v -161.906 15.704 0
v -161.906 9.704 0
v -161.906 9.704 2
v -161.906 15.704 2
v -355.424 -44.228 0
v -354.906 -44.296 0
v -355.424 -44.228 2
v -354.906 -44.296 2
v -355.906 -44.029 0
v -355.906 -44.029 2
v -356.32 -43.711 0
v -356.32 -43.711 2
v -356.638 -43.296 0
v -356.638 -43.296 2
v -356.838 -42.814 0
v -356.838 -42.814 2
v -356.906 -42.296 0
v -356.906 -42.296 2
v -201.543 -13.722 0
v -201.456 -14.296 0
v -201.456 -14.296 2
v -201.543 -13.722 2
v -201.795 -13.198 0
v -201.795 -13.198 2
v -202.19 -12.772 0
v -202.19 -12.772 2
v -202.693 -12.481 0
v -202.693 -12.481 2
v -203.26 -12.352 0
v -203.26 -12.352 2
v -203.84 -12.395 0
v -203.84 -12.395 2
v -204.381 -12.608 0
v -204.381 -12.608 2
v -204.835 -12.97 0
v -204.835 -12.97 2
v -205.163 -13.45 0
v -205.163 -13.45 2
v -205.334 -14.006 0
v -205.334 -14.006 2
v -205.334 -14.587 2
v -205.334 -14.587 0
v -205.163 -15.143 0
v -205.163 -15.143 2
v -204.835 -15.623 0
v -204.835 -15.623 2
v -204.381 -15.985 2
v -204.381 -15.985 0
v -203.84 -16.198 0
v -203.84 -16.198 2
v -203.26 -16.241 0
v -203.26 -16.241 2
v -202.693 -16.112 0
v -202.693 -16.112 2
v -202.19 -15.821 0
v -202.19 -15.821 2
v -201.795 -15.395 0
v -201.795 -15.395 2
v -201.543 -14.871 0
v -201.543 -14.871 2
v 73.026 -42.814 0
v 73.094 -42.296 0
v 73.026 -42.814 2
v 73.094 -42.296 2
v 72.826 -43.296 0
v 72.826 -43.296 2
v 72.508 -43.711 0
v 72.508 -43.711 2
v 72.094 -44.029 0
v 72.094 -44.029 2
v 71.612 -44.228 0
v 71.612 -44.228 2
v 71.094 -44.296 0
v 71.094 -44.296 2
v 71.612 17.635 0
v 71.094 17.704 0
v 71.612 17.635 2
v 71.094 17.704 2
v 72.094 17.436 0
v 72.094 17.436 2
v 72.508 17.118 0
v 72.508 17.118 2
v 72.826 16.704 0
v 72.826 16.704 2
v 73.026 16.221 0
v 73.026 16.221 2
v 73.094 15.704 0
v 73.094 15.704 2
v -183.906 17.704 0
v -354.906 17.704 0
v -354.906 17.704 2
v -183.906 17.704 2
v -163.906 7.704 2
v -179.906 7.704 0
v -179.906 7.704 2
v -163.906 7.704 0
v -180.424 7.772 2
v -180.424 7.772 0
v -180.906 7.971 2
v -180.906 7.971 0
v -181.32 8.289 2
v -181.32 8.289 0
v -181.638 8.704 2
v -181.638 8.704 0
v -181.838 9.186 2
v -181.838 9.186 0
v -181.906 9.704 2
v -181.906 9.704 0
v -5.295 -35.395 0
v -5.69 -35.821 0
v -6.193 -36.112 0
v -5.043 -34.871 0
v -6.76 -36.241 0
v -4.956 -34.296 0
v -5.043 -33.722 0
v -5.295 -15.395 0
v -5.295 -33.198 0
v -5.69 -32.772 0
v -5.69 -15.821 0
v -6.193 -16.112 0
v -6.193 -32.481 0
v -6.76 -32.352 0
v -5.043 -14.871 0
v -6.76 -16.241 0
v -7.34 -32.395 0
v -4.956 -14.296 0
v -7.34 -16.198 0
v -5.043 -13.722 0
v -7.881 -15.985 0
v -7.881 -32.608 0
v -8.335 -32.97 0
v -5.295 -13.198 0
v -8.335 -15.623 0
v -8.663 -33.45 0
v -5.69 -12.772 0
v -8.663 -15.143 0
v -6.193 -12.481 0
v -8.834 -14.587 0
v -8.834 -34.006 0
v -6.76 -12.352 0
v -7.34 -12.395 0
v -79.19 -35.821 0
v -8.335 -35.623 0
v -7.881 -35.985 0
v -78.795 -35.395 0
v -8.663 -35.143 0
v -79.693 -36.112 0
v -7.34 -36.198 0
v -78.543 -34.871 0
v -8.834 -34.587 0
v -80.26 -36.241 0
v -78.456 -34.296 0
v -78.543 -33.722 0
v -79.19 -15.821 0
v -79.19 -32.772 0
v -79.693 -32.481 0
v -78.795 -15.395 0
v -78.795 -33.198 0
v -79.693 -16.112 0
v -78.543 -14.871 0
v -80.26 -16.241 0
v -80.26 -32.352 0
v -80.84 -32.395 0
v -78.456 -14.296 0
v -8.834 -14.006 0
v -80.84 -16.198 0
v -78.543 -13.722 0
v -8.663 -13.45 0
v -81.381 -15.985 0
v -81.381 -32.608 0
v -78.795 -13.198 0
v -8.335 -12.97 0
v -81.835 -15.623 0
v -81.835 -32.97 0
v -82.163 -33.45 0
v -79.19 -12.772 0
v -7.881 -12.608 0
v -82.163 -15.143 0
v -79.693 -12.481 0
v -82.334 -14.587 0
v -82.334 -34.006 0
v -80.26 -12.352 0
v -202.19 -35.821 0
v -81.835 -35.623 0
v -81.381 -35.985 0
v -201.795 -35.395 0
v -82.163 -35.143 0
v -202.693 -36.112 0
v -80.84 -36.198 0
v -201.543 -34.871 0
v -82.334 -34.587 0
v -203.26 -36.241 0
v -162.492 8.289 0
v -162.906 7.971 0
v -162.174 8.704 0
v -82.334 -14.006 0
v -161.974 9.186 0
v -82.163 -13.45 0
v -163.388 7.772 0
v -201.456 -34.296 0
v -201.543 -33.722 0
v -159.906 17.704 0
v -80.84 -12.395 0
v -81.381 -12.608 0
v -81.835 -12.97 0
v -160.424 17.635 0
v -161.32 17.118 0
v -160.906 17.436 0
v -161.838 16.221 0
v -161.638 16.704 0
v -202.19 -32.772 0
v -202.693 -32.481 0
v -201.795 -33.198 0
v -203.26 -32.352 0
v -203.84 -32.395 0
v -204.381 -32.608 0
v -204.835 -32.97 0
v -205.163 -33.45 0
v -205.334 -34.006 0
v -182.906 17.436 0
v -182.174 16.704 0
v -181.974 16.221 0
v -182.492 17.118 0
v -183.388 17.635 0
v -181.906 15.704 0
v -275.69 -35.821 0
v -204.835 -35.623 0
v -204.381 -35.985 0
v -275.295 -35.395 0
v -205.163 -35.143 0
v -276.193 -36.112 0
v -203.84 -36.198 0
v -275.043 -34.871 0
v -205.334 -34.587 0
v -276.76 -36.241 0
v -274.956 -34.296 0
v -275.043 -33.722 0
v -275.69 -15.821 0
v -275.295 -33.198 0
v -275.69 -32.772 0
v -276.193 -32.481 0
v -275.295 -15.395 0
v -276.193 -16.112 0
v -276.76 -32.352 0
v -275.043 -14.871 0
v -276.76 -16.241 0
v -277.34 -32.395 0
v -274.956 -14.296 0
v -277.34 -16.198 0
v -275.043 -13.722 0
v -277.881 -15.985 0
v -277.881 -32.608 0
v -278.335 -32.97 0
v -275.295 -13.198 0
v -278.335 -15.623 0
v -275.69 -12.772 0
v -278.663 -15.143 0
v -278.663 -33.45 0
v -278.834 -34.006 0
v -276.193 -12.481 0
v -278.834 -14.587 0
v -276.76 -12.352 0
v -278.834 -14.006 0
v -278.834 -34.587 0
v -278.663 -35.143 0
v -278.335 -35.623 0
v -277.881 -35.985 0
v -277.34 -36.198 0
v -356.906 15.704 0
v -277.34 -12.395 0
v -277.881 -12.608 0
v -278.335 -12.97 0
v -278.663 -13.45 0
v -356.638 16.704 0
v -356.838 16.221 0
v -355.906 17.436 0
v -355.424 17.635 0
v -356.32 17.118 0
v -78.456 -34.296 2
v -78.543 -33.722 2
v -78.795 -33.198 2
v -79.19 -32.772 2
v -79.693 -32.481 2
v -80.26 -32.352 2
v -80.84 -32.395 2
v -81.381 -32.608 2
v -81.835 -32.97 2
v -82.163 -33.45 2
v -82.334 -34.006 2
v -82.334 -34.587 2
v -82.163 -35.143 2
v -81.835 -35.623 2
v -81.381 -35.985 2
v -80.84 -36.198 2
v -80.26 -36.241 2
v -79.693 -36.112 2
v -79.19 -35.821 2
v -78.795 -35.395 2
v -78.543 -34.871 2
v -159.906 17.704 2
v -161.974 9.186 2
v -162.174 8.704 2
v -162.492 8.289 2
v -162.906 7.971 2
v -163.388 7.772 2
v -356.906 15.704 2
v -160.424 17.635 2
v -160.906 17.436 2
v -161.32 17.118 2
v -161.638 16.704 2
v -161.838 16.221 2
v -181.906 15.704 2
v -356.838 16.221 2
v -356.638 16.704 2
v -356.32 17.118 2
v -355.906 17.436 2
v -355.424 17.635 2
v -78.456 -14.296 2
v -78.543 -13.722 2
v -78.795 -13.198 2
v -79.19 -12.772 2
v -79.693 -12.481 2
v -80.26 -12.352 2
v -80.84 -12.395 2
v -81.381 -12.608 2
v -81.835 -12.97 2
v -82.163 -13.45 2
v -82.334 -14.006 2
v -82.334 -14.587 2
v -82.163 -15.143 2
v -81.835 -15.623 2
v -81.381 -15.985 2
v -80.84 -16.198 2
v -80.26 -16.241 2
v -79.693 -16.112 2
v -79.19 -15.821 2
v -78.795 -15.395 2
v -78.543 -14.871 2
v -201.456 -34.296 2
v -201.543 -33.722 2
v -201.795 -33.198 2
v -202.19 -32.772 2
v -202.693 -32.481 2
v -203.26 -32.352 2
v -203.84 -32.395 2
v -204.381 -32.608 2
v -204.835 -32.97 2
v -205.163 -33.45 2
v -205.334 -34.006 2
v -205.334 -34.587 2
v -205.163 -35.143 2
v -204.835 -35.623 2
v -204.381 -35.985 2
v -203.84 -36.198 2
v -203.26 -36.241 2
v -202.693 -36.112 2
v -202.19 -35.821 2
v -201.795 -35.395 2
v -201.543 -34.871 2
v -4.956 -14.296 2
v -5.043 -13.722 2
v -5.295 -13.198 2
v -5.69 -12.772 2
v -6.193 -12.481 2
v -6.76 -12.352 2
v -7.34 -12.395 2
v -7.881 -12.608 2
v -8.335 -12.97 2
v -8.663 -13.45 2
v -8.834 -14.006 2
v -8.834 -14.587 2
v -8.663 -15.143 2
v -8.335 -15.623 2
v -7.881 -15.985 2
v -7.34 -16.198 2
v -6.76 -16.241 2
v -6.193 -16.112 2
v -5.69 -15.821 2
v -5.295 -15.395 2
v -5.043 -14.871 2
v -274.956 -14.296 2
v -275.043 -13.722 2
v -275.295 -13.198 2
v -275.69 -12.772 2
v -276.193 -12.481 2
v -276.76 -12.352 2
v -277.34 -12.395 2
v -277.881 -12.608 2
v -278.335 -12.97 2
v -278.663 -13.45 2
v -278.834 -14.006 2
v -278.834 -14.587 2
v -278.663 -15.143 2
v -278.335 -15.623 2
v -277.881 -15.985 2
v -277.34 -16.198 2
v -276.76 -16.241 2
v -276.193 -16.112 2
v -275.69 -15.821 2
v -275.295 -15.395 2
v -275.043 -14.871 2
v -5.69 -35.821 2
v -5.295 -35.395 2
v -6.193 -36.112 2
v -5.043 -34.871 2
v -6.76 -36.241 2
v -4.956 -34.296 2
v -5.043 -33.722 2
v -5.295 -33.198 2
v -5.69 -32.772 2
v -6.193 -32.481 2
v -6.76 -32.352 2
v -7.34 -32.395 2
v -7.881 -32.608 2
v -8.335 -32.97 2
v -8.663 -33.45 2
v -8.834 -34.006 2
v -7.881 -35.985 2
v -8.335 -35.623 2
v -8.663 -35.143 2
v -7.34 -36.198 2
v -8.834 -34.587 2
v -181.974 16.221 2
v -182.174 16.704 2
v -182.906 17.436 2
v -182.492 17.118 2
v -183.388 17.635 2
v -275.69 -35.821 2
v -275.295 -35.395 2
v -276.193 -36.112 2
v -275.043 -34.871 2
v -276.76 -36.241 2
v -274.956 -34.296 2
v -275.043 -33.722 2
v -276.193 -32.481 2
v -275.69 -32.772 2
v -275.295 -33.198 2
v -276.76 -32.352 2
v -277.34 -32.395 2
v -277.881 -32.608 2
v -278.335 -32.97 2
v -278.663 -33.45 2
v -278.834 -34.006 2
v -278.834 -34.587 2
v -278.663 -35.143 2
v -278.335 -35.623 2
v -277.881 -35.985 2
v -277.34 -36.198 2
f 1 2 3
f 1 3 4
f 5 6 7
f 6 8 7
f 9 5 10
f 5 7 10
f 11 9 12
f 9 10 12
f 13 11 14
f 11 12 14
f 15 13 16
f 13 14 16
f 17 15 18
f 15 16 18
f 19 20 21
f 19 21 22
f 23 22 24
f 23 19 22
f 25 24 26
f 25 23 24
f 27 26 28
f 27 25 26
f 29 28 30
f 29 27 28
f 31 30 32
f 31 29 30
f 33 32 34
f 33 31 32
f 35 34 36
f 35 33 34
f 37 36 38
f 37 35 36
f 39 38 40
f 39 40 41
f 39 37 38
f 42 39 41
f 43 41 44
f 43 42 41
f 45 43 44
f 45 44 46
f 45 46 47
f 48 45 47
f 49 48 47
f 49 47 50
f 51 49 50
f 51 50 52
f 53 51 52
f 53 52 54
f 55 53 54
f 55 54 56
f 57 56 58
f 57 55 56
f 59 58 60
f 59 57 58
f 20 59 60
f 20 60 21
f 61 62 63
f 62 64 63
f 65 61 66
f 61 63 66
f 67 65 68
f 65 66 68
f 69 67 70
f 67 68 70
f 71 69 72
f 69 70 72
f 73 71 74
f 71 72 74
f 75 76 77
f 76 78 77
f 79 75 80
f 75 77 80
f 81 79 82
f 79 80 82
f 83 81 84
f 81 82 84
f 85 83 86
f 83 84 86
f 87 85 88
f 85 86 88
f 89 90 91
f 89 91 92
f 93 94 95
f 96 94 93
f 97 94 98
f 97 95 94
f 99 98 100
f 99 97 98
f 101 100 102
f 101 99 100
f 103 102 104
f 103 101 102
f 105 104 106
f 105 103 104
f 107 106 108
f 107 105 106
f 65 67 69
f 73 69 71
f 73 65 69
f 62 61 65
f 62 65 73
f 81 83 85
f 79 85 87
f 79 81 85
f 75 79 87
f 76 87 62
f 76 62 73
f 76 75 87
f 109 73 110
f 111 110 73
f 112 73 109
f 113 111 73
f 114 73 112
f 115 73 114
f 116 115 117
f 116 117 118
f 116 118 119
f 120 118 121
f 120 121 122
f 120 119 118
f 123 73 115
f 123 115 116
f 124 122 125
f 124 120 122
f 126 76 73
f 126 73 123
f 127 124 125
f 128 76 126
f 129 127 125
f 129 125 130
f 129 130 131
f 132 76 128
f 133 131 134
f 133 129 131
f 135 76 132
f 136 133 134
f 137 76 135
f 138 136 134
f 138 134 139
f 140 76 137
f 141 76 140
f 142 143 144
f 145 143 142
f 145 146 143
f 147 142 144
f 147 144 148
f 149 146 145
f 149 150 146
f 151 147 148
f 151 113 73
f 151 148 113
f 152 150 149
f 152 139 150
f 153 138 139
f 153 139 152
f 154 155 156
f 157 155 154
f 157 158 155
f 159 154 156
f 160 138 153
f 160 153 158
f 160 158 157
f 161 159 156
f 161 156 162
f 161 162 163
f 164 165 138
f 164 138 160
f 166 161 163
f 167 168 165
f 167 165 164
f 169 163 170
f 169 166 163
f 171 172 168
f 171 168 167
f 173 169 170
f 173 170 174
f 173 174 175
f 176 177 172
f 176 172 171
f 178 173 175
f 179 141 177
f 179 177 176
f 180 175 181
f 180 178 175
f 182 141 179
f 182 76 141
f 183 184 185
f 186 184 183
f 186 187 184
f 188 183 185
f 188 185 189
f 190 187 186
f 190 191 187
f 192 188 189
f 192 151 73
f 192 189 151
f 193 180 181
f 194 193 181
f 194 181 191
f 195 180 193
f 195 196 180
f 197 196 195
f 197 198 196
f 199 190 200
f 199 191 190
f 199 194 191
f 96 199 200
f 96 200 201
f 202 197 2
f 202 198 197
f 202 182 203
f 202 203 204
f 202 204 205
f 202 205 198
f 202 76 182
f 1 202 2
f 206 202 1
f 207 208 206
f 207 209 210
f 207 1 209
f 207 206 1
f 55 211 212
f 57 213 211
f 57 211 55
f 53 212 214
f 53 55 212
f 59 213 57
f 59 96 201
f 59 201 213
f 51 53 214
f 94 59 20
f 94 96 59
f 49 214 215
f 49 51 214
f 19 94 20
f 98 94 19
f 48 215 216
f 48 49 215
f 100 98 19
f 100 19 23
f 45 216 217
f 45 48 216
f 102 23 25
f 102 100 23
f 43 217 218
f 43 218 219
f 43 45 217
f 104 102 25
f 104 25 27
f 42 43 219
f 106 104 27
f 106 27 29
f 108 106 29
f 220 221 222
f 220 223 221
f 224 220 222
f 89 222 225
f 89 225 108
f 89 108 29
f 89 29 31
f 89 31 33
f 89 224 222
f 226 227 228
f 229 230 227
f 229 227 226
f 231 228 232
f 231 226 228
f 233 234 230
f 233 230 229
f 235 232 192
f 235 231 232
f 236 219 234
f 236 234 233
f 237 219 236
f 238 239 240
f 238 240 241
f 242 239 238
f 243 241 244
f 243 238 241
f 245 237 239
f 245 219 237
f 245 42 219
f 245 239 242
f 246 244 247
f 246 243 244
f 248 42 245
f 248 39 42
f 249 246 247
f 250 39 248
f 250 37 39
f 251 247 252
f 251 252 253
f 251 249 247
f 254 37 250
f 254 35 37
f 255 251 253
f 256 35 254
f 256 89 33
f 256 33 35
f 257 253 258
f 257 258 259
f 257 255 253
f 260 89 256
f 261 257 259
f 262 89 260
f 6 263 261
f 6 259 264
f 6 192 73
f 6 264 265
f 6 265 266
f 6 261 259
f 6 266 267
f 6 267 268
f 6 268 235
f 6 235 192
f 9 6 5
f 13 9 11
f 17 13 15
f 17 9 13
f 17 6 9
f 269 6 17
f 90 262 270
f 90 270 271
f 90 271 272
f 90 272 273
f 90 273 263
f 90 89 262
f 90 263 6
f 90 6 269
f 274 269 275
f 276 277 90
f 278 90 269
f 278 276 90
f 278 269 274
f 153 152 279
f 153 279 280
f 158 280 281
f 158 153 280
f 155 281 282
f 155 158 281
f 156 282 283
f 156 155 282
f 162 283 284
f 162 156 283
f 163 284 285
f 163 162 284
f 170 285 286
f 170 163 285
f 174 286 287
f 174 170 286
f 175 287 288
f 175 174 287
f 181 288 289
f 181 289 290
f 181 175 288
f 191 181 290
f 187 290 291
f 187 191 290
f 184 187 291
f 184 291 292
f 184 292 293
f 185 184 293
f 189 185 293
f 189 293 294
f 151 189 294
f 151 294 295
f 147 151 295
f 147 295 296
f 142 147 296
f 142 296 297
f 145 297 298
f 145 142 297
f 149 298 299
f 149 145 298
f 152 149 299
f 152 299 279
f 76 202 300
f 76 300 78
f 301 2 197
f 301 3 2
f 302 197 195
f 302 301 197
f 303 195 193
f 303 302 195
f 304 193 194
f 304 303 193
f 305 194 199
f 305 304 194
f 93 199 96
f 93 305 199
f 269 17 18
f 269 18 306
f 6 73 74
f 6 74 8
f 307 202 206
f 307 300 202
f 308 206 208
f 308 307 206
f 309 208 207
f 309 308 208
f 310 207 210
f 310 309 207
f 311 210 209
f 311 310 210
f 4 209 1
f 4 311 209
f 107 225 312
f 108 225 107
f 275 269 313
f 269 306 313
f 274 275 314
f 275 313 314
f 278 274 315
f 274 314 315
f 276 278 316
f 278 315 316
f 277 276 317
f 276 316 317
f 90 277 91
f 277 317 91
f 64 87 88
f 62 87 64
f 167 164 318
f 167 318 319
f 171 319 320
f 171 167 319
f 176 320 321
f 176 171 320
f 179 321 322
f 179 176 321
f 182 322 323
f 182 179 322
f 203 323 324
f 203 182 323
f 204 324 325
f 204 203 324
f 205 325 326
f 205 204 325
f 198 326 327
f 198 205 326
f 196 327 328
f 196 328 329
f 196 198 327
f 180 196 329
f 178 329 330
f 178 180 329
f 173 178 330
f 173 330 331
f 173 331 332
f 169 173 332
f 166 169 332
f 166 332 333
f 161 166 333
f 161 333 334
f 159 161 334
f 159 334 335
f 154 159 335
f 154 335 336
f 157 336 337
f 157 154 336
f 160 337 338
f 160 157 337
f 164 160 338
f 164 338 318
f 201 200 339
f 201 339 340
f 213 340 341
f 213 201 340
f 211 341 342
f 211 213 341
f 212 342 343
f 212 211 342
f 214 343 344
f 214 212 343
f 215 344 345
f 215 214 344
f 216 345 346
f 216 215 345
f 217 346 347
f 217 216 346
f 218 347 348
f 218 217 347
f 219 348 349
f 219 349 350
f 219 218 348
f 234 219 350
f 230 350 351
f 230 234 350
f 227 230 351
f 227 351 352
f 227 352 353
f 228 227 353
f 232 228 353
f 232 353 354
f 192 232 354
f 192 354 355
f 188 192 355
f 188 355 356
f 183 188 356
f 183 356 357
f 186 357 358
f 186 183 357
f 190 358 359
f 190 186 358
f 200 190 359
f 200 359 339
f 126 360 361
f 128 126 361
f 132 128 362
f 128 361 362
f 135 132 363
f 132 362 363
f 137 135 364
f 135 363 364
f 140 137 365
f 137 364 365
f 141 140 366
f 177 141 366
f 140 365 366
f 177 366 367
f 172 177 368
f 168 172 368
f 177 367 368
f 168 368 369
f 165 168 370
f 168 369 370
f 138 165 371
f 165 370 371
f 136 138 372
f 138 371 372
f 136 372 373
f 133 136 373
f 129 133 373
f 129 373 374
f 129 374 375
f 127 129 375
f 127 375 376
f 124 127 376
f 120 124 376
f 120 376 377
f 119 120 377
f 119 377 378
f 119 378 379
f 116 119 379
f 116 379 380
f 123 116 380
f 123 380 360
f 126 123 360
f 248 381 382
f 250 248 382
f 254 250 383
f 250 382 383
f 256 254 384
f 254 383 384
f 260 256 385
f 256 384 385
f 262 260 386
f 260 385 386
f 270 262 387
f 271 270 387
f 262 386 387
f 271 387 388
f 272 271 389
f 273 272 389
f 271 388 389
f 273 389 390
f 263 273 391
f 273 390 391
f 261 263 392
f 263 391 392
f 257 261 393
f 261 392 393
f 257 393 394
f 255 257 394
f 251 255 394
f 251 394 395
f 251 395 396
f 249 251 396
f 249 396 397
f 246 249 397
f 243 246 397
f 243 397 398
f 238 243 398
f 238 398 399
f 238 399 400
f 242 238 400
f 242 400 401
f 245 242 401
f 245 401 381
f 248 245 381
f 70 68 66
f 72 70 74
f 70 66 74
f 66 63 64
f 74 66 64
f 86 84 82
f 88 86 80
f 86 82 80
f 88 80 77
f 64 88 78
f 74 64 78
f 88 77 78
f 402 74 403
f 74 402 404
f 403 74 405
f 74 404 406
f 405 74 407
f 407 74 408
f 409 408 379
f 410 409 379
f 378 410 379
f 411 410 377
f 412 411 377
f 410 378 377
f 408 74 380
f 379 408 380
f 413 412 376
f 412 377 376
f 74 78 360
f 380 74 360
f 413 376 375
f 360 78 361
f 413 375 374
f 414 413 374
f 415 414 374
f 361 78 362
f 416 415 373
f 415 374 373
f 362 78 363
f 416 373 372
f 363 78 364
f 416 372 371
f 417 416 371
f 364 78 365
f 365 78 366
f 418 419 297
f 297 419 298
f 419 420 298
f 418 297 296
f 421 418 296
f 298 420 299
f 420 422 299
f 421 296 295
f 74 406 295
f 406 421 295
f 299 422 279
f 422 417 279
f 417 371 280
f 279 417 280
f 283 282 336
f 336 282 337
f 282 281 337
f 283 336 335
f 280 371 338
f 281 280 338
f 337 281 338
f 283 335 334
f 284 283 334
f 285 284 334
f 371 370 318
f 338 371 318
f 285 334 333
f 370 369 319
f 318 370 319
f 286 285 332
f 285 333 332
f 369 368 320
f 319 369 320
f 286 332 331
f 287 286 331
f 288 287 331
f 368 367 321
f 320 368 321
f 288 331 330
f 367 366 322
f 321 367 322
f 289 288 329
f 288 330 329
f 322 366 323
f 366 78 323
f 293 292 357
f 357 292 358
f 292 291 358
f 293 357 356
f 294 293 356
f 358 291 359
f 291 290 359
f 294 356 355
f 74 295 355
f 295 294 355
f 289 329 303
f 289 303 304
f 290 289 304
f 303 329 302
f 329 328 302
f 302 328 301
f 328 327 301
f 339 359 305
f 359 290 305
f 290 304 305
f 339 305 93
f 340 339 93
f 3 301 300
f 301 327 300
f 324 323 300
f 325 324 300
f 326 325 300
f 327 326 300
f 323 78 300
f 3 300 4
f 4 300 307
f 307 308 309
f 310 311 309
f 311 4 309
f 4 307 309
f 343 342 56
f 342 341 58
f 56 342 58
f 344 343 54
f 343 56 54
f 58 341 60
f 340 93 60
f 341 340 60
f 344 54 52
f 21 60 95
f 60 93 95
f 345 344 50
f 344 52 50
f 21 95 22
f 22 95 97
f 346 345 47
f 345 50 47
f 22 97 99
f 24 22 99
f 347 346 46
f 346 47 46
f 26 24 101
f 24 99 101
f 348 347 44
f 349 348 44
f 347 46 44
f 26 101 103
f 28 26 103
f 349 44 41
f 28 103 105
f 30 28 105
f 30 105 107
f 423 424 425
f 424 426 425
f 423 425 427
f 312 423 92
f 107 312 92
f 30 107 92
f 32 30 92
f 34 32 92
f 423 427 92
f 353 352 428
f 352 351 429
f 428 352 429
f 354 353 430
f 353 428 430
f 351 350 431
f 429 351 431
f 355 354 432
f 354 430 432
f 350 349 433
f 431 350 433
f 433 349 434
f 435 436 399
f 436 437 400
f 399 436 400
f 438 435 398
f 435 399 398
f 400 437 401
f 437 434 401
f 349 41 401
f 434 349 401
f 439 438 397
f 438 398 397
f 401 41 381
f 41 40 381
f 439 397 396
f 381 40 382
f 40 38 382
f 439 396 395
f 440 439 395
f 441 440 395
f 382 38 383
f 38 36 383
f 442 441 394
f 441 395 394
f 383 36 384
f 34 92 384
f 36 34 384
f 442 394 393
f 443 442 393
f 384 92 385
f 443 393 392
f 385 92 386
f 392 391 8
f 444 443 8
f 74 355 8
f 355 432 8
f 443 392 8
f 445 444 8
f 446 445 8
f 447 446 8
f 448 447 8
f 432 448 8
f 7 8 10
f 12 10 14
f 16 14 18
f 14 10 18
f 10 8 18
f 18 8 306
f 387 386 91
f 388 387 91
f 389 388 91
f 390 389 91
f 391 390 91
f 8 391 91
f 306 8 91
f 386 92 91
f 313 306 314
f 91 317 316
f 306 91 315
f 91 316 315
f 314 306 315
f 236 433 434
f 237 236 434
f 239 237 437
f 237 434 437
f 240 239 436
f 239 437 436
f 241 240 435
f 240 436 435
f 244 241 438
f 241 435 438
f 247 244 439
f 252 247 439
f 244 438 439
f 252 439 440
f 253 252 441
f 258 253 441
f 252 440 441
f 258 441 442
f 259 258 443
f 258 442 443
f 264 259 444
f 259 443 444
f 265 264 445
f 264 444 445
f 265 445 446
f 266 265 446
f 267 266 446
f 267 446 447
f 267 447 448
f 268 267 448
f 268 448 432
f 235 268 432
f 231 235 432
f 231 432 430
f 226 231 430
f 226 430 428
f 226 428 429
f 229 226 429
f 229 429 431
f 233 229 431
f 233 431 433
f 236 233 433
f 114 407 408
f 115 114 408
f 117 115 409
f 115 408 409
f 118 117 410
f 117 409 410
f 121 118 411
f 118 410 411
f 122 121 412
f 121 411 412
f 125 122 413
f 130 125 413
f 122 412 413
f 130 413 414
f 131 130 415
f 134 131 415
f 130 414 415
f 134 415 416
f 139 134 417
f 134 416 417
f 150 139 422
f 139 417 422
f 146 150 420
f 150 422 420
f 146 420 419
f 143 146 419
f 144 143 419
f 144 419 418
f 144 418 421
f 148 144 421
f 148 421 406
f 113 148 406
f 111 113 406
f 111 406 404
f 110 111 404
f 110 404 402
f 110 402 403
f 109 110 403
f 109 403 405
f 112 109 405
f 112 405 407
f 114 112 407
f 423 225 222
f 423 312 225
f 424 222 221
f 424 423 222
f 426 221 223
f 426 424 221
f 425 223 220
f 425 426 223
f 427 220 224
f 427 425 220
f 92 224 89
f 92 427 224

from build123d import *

# Parameters (mm, degrees)
SKETCH1_R           = 1.95
BOSS_EXTRUDE1_DEPTH = 2
FILLET1_R           = 2
SKETCH2_R           = 1.95
CUT_EXTRUDE1_DEPTH  = 10


with BuildPart() as part:
    # Sketch1 → Boss-Extrude1 (new body)
    with BuildSketch(Plane.XY):
        Polygon((-161.905896291, 17.703517588), (73.094103709, 17.703517588), (73.094103709, -44.296482412), (-356.905896291, -44.296482412), (-356.905896291, 17.703517588), (-181.905896291, 17.703517588), (-181.905896291, 7.703517588), (-161.905896291, 7.703517588), align=None)
        with Locations((-80.405896291, -14.296482412)):
            Circle(SKETCH1_R, mode=Mode.SUBTRACT)
        with Locations((-80.405896291, -34.296482412)):
            Circle(SKETCH1_R, mode=Mode.SUBTRACT)
        with Locations((-203.405896291, -14.296482412)):
            Circle(SKETCH1_R, mode=Mode.SUBTRACT)
        with Locations((-203.405896291, -34.296482412)):
            Circle(SKETCH1_R, mode=Mode.SUBTRACT)
    extrude(amount=BOSS_EXTRUDE1_DEPTH)

    # Fillet1
    fillet1_edges = [part.edges().sort_by_distance(p)[0] for p in [
        (-356.905896291, 17.703517588, 1),
        (-181.905896291, 17.703517588, 1),
        (-181.905896291, 7.703517588, 1),
        (-161.905896291, 7.703517588, 1),
        (-161.905896291, 17.703517588, 1),
        (73.094103709, 17.703517588, 1),
        (73.094103709, -44.296482412, 1),
        (-356.905896291, -44.296482412, 1),
    ]]
    fillet(fillet1_edges, radius=FILLET1_R)

    # Sketch2 → Cut-Extrude1 (cut)
    with BuildSketch(Plane.XY.offset(2)):
        with Locations((-276.905896291, -14.296482412)):
            Circle(SKETCH2_R)
        with Locations((-276.905896291, -34.296482412)):
            Circle(SKETCH2_R)
        with Locations((-6.905896291, -14.296482412)):
            Circle(SKETCH2_R)
        with Locations((-6.905896291, -34.296482412)):
            Circle(SKETCH2_R)
    extrude(amount=-CUT_EXTRUDE1_DEPTH, mode=Mode.SUBTRACT)


solid = part.part
